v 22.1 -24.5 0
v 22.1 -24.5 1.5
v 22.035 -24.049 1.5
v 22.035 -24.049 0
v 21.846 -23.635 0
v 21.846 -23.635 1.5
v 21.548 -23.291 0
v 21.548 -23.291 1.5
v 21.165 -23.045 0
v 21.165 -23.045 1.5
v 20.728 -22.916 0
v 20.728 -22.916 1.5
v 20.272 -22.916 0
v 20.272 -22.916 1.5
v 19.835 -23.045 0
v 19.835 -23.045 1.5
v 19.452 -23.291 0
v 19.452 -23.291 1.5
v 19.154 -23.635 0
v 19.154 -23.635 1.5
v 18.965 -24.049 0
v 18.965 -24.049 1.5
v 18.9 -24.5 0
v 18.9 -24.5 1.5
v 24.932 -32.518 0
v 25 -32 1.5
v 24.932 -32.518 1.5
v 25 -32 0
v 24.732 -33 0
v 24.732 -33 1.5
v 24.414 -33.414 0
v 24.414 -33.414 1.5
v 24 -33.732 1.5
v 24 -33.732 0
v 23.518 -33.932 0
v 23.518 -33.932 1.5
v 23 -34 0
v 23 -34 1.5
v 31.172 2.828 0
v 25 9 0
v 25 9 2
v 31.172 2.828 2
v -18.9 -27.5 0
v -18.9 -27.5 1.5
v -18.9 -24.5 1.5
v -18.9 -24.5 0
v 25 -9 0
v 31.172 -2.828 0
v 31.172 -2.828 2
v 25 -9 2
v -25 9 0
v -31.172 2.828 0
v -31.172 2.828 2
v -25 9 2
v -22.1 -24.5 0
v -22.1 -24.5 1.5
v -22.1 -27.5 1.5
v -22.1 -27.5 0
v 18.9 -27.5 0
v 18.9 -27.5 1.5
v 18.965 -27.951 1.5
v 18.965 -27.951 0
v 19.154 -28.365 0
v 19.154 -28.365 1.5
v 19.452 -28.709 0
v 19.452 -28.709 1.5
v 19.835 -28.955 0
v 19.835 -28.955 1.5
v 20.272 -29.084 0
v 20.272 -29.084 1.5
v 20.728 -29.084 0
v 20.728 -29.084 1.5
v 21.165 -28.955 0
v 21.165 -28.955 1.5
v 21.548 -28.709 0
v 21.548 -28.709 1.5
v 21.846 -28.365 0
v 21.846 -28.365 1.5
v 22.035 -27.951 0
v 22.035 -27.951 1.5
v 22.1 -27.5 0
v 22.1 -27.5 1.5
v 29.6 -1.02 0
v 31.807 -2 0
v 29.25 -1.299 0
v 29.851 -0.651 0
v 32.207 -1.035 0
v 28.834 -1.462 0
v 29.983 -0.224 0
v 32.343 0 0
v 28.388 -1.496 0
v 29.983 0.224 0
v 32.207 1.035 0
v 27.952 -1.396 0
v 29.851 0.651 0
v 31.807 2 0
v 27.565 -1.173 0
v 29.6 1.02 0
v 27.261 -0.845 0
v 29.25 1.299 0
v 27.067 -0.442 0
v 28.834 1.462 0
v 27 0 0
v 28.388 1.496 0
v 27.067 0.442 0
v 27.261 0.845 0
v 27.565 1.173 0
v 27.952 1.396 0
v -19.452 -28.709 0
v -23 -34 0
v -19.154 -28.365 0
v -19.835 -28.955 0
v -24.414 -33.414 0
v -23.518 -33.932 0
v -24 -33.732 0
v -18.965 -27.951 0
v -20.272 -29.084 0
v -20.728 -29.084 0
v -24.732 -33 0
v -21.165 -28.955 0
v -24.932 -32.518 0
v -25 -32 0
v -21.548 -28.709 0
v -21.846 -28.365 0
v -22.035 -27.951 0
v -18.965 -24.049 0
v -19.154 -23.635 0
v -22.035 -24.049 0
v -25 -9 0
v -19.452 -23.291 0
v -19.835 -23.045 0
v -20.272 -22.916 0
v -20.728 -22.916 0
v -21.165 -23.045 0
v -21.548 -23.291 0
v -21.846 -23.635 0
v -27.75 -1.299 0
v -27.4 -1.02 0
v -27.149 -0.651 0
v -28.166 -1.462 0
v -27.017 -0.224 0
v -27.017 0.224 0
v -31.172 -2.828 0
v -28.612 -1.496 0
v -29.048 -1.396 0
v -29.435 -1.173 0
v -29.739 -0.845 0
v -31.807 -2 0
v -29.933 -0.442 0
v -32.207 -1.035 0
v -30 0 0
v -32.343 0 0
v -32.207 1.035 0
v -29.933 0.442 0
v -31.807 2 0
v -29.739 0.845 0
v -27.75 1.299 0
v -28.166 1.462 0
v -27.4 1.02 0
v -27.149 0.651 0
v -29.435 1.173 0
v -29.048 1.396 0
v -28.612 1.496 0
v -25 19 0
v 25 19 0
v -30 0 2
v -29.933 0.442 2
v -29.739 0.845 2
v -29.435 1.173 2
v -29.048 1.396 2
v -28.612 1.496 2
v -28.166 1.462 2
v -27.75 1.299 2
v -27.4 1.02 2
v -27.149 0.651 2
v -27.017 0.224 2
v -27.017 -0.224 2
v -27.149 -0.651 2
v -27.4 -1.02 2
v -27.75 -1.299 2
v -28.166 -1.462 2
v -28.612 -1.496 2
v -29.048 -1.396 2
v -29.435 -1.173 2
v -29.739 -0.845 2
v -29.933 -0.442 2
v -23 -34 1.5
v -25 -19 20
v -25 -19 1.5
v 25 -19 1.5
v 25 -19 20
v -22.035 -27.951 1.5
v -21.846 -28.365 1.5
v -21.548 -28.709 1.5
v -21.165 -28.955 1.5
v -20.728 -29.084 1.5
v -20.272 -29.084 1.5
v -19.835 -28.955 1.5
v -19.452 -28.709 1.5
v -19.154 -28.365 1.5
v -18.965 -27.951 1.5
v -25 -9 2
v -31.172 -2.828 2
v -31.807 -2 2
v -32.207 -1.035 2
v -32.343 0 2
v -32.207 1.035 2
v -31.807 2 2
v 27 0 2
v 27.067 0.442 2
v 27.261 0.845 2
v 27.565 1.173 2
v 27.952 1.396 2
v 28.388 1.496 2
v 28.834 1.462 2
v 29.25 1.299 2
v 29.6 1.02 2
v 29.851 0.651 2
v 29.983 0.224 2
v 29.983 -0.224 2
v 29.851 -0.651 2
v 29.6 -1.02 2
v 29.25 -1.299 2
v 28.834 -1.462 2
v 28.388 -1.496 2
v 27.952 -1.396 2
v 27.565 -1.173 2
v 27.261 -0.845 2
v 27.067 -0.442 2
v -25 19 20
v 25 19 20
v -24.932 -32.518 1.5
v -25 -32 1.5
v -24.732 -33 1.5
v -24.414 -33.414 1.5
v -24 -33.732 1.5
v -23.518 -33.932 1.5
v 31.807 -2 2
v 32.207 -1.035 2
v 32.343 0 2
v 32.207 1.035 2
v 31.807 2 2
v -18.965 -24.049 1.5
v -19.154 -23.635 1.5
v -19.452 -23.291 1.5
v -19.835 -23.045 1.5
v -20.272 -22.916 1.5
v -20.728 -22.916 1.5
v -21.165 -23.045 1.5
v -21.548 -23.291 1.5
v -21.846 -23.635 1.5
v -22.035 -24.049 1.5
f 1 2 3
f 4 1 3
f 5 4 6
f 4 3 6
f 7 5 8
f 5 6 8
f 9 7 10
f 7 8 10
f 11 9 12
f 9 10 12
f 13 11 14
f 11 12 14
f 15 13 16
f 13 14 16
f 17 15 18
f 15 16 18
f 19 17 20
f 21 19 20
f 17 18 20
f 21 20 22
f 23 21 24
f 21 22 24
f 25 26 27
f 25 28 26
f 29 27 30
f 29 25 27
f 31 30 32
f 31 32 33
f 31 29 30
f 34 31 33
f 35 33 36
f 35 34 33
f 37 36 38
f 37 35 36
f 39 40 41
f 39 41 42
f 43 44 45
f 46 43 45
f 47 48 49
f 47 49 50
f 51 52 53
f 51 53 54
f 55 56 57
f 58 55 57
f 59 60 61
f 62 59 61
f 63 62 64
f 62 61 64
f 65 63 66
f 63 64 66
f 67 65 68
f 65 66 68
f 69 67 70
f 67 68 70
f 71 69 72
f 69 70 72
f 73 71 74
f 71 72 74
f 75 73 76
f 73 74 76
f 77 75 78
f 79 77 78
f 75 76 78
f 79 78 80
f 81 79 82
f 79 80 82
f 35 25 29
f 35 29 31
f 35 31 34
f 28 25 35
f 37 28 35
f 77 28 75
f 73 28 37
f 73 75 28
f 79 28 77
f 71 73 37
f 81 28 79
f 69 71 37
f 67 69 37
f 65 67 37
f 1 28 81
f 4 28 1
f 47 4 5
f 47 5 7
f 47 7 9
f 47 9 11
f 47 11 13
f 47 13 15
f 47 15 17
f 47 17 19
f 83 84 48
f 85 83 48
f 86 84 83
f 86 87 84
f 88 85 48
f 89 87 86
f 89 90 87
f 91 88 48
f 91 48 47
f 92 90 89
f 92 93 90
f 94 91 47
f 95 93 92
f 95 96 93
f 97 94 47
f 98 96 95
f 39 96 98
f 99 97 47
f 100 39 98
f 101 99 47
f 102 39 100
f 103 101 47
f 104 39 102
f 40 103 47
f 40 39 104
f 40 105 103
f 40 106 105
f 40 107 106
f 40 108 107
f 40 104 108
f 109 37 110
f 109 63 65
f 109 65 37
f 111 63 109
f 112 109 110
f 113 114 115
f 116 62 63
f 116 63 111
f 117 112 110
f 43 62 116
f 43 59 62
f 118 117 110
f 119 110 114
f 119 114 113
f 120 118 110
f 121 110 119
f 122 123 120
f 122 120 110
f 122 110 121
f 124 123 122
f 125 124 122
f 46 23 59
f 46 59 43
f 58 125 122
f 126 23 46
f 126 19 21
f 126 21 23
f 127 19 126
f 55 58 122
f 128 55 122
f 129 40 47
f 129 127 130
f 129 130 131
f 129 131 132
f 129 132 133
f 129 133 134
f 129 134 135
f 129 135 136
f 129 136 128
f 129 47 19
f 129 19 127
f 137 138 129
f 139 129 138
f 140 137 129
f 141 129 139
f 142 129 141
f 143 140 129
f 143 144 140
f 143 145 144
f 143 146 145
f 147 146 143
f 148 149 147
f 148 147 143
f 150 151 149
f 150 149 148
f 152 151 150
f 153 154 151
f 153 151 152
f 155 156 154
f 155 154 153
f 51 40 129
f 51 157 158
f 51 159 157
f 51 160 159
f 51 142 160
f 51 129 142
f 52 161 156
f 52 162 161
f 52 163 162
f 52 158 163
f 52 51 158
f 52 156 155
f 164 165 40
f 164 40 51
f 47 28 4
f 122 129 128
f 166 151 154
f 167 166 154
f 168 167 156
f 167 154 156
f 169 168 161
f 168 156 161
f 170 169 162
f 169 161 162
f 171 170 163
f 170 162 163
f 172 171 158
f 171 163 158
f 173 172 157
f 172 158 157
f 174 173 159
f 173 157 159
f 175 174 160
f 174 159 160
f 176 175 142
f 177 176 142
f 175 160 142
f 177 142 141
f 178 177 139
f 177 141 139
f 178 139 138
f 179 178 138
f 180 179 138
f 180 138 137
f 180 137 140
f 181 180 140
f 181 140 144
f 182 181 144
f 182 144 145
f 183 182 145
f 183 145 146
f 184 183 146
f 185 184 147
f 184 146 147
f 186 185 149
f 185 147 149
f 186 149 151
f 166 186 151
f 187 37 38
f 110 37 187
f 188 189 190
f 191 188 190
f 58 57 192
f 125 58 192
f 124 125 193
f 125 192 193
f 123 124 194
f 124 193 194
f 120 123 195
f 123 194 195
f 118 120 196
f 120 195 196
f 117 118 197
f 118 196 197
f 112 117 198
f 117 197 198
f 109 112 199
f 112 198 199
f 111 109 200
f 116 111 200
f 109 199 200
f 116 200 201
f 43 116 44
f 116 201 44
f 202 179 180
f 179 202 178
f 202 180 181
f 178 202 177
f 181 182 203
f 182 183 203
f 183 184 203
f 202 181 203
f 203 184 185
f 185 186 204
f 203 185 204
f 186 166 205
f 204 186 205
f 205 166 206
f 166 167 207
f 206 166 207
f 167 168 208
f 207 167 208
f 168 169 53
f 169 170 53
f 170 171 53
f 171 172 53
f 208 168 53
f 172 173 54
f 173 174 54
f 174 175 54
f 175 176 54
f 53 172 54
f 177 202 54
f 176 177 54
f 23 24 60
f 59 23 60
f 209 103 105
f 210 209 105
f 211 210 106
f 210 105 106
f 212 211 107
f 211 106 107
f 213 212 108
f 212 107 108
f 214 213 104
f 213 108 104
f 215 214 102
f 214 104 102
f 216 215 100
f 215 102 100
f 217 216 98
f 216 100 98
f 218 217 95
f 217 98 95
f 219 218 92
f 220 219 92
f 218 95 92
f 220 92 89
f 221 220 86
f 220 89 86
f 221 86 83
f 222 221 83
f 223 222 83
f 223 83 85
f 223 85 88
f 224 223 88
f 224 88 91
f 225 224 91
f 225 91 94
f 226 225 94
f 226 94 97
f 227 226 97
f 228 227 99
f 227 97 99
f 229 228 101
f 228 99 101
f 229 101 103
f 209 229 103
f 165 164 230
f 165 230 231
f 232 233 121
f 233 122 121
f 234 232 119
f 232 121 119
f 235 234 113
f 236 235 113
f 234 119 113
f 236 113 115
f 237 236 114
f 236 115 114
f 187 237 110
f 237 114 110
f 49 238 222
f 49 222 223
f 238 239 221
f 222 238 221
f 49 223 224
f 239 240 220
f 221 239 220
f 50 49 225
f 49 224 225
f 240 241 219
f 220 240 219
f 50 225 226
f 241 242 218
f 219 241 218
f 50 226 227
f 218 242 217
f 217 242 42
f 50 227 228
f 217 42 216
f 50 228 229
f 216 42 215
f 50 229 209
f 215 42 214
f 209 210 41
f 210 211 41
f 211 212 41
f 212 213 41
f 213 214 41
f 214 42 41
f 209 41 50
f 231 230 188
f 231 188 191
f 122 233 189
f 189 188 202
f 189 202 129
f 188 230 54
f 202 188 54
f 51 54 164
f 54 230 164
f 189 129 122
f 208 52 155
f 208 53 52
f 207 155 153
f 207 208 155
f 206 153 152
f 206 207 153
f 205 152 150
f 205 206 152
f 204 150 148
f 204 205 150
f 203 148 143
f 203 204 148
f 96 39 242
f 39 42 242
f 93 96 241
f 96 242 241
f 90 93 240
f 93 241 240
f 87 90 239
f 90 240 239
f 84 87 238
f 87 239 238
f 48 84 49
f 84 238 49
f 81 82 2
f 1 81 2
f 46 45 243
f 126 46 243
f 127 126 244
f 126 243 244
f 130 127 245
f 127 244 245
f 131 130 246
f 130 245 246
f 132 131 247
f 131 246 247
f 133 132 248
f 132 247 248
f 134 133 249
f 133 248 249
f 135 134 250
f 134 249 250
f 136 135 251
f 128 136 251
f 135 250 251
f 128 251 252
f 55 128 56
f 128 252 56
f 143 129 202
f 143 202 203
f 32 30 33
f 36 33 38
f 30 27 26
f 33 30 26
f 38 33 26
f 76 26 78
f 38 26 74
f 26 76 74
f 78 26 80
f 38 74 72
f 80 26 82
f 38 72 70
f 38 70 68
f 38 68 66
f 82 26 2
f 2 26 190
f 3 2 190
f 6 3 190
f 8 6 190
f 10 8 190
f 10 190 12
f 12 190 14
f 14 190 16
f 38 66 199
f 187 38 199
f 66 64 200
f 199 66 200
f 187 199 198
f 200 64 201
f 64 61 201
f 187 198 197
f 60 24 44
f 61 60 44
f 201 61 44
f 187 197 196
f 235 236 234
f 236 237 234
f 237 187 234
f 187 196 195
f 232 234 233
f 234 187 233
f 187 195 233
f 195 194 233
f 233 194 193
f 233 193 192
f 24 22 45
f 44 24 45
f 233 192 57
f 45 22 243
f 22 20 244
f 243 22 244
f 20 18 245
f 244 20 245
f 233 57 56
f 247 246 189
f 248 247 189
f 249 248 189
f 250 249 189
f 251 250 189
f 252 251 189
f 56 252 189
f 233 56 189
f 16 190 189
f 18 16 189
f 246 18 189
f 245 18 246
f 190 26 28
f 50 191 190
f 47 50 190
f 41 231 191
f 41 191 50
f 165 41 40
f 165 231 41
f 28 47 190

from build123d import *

# Parameters (mm, degrees)
ESQUISSE1_W             = 50
ESQUISSE1_H             = 38
BOSS_EXTRU_1_DEPTH      = 20
ESQUISSE2_W             = 50
ESQUISSE2_H             = 1.5
BOSS_EXTRU_2_DEPTH      = 15
CONG_1_R                = 2
ENL_V_MAT_EXTRU_1_DEPTH = 47.078736962
ESQUISSE4_R             = 1.5
BOSS_EXTRU_3_DEPTH      = 2
CONG_2_R                = 4


with BuildPart() as part:
    # Esquisse1 → Boss.-Extru.1 (new body)
    with BuildSketch(Plane.XY):
        Rectangle(ESQUISSE1_W, ESQUISSE1_H)
    extrude(amount=BOSS_EXTRU_1_DEPTH)

    # Esquisse2 → Boss.-Extru.2 (add)
    with BuildSketch(Plane(origin=(0, -19, 0), x_dir=(-1, 0, 0), z_dir=(0, -1, 0))):
        with Locations((0, -0.75)):
            Rectangle(ESQUISSE2_W, ESQUISSE2_H)
    extrude(amount=BOSS_EXTRU_2_DEPTH)

    # Congé1
    cong_1_edges = [part.edges().sort_by_distance(p)[0] for p in [
        (-25, -34, 0.75),
        (25, -34, 0.75),
    ]]
    fillet(cong_1_edges, radius=CONG_1_R)

    # Esquisse3 → Enlèv. mat.-Extru.1 (cut, through all)
    with BuildSketch(Plane.XY.offset(1.5)):
        with BuildLine():
            Line((-22.1, -24.5), (-22.1, -27.5))
            ThreePointArc((-22.1, -27.5), (-20.5, -29.1), (-18.9, -27.5))
            Line((-18.9, -27.5), (-18.9, -24.5))
            ThreePointArc((-18.9, -24.5), (-20.5, -22.9), (-22.1, -24.5))
        make_face()
        with BuildLine():
            Line((18.9, -24.5), (18.9, -27.5))
            ThreePointArc((18.9, -27.5), (20.5, -29.1), (22.1, -27.5))
            Line((22.1, -27.5), (22.1, -24.5))
            ThreePointArc((22.1, -24.5), (20.5, -22.9), (18.9, -24.5))
        make_face()
    extrude(amount=-ENL_V_MAT_EXTRU_1_DEPTH, mode=Mode.SUBTRACT)

    # Esquisse4 → Boss.-Extru.3 (add)
    # profile 1 of 2: a face of its own
    with BuildSketch(Plane(origin=(0, 0, 0), x_dir=(-1, 0, 0), z_dir=(0, 0, -1))):
        Polygon((-25, 9), (-34, 0), (-25, -9), align=None)
        with Locations((-28.5, 0)):
            Circle(ESQUISSE4_R, mode=Mode.SUBTRACT)
    # profile 2 of 2: a face of its own
    with BuildSketch(Plane(origin=(0, 0, 0), x_dir=(-1, 0, 0), z_dir=(0, 0, -1))):
        Polygon((25, -9), (34, 0), (25, 9), align=None)
        with Locations((28.5, 0)):
            Circle(ESQUISSE4_R, mode=Mode.SUBTRACT)
    extrude(amount=-BOSS_EXTRU_3_DEPTH)

    # Congé2
    cong_2_edges = [part.edges().sort_by_distance(p)[0] for p in [
        (34, 0, 1),
        (-34, 0, 1),
    ]]
    fillet(cong_2_edges, radius=CONG_2_R)


solid = part.part
